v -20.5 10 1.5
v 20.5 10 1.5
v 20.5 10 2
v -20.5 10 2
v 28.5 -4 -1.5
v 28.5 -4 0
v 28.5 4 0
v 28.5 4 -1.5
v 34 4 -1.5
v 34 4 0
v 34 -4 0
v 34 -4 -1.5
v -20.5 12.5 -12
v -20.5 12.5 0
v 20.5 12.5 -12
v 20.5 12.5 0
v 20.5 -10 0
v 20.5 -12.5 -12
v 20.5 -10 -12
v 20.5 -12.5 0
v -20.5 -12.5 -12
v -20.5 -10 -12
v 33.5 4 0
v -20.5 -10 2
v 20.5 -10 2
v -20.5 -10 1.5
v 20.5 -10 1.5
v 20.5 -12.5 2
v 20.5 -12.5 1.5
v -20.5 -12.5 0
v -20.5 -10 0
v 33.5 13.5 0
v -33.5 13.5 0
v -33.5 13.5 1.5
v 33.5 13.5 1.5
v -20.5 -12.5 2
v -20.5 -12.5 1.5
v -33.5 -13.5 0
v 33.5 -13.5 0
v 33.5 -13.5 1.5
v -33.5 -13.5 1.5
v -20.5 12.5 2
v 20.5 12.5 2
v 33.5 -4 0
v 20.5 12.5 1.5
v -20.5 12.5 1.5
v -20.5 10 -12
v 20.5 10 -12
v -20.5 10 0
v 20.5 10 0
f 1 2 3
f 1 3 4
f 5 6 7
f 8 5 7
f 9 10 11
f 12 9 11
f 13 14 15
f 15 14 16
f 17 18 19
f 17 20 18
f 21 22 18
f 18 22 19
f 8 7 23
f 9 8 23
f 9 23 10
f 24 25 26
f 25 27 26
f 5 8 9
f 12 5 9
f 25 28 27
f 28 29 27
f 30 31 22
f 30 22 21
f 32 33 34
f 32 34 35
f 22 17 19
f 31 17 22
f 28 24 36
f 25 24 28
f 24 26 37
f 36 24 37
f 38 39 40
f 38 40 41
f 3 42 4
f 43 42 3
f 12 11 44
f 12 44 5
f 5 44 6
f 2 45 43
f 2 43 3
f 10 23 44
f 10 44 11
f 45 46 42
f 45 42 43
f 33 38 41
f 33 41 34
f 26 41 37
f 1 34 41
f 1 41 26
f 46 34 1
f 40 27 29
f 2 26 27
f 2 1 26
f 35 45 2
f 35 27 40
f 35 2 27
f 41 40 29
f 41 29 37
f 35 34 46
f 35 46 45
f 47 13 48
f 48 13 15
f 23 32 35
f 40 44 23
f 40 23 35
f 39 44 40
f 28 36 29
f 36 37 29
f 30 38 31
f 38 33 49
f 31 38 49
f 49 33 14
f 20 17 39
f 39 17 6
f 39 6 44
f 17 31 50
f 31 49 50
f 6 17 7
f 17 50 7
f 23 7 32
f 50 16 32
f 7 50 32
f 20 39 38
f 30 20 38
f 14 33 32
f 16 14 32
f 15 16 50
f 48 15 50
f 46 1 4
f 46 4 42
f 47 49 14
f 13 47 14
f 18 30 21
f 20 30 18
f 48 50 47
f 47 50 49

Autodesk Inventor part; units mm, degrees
ref_plane "YZ Plane" through (0, 0, 0) normal (1, 0, 0) x (0, 1, 0)
ref_plane "XZ Plane" through (0, 0, 0) normal (0, 1, 0) x (-1, 0, 0)
ref_plane "XY Plane" through (0, 0, 0) normal (0, 0, 1) x (1, 0, 0)
sketch "スケッチ1" plane through (0, 0, 0) normal (0, 0, 1) x (1, 0, 0)
  line L0 (-33.5, 13.5) -> (33.5, 13.5)
  line L1 (33.5, 13.5) -> (33.5, -13.5)
  line L2 (33.5, -13.5) -> (-33.5, -13.5)
  line L3 (-33.5, -13.5) -> (-33.5, 13.5)
  line L4 (-33.5, 13.5) -> (33.5, -13.5) construction
  line L5 (33.5, 13.5) -> (-33.5, -13.5) construction
  line L6 (-47, 0) -> (47.5, 0) construction
  line L7 (33.5, 4) -> (34, 4)
  line L8 (34, 4) -> (34, -4)
  line L9 (34, -4) -> (33.5, -4)
  line L10 (33.5, -4) -> (33.5, 4) construction
  line L11 (33.5, 4) -> (34, -4) construction
  line L12 (34, 4) -> (33.5, -4) construction
  line L13 (0, 18.9) -> (0, -18.9) construction
  line L14 (-20.5, 12.5) -> (20.5, 12.5)
  line L15 (20.5, 12.5) -> (20.5, 10)
  line L16 (20.5, 10) -> (-20.5, 10)
  line L17 (-20.5, 10) -> (-20.5, 12.5)
  line L18 (-20.5, 12.5) -> (20.5, 10) construction
  line L19 (20.5, 12.5) -> (-20.5, 10) construction
  line L20 (-20.5, -12.5) -> (20.5, -12.5)
  line L21 (20.5, -12.5) -> (20.5, -10)
  line L22 (20.5, -10) -> (-20.5, -10)
  line L23 (-20.5, -10) -> (-20.5, -12.5)
  line L24 (33.5, -4) -> (28.5, -4)
  line L25 (28.5, -4) -> (28.5, 4)
  line L26 (28.5, 4) -> (33.5, 4)
  point P0 (0, 0)
  point P1 (33.75, 0)
  point P2 (0, 11.25)
  dimension "d0" = 67
  dimension "d1" = 27
  dimension "d2" = 0.5
  dimension "d3" = 8
  dimension "d6" = 41
  dimension "d7" = 2.5
  dimension "d8" = 1
  dimension "d9" = 5
extrude "押し出し1" add sketch "スケッチ1" along normal blind 1.5 contours L0 L1 L26 L25 L24 L2 L3 | L1 L24 L25 L26 | L14 L15 L16 L17 | L23 L22 L21 L20
extrude "押し出し2" add sketch "スケッチ1" against normal blind 1.5 contours L7 L8 L9 L1 | L1 L24 L25 L26
extrude "押し出し3" add sketch "スケッチ1" against normal blind 12 contours L14 L15 L16 L17 | L23 L22 L21 L20
extrude "押し出し4" add sketch "スケッチ1" along normal blind 2 contours L14 L15 L16 L17 | L23 L22 L21 L20
properties part number "opencm9.04"
